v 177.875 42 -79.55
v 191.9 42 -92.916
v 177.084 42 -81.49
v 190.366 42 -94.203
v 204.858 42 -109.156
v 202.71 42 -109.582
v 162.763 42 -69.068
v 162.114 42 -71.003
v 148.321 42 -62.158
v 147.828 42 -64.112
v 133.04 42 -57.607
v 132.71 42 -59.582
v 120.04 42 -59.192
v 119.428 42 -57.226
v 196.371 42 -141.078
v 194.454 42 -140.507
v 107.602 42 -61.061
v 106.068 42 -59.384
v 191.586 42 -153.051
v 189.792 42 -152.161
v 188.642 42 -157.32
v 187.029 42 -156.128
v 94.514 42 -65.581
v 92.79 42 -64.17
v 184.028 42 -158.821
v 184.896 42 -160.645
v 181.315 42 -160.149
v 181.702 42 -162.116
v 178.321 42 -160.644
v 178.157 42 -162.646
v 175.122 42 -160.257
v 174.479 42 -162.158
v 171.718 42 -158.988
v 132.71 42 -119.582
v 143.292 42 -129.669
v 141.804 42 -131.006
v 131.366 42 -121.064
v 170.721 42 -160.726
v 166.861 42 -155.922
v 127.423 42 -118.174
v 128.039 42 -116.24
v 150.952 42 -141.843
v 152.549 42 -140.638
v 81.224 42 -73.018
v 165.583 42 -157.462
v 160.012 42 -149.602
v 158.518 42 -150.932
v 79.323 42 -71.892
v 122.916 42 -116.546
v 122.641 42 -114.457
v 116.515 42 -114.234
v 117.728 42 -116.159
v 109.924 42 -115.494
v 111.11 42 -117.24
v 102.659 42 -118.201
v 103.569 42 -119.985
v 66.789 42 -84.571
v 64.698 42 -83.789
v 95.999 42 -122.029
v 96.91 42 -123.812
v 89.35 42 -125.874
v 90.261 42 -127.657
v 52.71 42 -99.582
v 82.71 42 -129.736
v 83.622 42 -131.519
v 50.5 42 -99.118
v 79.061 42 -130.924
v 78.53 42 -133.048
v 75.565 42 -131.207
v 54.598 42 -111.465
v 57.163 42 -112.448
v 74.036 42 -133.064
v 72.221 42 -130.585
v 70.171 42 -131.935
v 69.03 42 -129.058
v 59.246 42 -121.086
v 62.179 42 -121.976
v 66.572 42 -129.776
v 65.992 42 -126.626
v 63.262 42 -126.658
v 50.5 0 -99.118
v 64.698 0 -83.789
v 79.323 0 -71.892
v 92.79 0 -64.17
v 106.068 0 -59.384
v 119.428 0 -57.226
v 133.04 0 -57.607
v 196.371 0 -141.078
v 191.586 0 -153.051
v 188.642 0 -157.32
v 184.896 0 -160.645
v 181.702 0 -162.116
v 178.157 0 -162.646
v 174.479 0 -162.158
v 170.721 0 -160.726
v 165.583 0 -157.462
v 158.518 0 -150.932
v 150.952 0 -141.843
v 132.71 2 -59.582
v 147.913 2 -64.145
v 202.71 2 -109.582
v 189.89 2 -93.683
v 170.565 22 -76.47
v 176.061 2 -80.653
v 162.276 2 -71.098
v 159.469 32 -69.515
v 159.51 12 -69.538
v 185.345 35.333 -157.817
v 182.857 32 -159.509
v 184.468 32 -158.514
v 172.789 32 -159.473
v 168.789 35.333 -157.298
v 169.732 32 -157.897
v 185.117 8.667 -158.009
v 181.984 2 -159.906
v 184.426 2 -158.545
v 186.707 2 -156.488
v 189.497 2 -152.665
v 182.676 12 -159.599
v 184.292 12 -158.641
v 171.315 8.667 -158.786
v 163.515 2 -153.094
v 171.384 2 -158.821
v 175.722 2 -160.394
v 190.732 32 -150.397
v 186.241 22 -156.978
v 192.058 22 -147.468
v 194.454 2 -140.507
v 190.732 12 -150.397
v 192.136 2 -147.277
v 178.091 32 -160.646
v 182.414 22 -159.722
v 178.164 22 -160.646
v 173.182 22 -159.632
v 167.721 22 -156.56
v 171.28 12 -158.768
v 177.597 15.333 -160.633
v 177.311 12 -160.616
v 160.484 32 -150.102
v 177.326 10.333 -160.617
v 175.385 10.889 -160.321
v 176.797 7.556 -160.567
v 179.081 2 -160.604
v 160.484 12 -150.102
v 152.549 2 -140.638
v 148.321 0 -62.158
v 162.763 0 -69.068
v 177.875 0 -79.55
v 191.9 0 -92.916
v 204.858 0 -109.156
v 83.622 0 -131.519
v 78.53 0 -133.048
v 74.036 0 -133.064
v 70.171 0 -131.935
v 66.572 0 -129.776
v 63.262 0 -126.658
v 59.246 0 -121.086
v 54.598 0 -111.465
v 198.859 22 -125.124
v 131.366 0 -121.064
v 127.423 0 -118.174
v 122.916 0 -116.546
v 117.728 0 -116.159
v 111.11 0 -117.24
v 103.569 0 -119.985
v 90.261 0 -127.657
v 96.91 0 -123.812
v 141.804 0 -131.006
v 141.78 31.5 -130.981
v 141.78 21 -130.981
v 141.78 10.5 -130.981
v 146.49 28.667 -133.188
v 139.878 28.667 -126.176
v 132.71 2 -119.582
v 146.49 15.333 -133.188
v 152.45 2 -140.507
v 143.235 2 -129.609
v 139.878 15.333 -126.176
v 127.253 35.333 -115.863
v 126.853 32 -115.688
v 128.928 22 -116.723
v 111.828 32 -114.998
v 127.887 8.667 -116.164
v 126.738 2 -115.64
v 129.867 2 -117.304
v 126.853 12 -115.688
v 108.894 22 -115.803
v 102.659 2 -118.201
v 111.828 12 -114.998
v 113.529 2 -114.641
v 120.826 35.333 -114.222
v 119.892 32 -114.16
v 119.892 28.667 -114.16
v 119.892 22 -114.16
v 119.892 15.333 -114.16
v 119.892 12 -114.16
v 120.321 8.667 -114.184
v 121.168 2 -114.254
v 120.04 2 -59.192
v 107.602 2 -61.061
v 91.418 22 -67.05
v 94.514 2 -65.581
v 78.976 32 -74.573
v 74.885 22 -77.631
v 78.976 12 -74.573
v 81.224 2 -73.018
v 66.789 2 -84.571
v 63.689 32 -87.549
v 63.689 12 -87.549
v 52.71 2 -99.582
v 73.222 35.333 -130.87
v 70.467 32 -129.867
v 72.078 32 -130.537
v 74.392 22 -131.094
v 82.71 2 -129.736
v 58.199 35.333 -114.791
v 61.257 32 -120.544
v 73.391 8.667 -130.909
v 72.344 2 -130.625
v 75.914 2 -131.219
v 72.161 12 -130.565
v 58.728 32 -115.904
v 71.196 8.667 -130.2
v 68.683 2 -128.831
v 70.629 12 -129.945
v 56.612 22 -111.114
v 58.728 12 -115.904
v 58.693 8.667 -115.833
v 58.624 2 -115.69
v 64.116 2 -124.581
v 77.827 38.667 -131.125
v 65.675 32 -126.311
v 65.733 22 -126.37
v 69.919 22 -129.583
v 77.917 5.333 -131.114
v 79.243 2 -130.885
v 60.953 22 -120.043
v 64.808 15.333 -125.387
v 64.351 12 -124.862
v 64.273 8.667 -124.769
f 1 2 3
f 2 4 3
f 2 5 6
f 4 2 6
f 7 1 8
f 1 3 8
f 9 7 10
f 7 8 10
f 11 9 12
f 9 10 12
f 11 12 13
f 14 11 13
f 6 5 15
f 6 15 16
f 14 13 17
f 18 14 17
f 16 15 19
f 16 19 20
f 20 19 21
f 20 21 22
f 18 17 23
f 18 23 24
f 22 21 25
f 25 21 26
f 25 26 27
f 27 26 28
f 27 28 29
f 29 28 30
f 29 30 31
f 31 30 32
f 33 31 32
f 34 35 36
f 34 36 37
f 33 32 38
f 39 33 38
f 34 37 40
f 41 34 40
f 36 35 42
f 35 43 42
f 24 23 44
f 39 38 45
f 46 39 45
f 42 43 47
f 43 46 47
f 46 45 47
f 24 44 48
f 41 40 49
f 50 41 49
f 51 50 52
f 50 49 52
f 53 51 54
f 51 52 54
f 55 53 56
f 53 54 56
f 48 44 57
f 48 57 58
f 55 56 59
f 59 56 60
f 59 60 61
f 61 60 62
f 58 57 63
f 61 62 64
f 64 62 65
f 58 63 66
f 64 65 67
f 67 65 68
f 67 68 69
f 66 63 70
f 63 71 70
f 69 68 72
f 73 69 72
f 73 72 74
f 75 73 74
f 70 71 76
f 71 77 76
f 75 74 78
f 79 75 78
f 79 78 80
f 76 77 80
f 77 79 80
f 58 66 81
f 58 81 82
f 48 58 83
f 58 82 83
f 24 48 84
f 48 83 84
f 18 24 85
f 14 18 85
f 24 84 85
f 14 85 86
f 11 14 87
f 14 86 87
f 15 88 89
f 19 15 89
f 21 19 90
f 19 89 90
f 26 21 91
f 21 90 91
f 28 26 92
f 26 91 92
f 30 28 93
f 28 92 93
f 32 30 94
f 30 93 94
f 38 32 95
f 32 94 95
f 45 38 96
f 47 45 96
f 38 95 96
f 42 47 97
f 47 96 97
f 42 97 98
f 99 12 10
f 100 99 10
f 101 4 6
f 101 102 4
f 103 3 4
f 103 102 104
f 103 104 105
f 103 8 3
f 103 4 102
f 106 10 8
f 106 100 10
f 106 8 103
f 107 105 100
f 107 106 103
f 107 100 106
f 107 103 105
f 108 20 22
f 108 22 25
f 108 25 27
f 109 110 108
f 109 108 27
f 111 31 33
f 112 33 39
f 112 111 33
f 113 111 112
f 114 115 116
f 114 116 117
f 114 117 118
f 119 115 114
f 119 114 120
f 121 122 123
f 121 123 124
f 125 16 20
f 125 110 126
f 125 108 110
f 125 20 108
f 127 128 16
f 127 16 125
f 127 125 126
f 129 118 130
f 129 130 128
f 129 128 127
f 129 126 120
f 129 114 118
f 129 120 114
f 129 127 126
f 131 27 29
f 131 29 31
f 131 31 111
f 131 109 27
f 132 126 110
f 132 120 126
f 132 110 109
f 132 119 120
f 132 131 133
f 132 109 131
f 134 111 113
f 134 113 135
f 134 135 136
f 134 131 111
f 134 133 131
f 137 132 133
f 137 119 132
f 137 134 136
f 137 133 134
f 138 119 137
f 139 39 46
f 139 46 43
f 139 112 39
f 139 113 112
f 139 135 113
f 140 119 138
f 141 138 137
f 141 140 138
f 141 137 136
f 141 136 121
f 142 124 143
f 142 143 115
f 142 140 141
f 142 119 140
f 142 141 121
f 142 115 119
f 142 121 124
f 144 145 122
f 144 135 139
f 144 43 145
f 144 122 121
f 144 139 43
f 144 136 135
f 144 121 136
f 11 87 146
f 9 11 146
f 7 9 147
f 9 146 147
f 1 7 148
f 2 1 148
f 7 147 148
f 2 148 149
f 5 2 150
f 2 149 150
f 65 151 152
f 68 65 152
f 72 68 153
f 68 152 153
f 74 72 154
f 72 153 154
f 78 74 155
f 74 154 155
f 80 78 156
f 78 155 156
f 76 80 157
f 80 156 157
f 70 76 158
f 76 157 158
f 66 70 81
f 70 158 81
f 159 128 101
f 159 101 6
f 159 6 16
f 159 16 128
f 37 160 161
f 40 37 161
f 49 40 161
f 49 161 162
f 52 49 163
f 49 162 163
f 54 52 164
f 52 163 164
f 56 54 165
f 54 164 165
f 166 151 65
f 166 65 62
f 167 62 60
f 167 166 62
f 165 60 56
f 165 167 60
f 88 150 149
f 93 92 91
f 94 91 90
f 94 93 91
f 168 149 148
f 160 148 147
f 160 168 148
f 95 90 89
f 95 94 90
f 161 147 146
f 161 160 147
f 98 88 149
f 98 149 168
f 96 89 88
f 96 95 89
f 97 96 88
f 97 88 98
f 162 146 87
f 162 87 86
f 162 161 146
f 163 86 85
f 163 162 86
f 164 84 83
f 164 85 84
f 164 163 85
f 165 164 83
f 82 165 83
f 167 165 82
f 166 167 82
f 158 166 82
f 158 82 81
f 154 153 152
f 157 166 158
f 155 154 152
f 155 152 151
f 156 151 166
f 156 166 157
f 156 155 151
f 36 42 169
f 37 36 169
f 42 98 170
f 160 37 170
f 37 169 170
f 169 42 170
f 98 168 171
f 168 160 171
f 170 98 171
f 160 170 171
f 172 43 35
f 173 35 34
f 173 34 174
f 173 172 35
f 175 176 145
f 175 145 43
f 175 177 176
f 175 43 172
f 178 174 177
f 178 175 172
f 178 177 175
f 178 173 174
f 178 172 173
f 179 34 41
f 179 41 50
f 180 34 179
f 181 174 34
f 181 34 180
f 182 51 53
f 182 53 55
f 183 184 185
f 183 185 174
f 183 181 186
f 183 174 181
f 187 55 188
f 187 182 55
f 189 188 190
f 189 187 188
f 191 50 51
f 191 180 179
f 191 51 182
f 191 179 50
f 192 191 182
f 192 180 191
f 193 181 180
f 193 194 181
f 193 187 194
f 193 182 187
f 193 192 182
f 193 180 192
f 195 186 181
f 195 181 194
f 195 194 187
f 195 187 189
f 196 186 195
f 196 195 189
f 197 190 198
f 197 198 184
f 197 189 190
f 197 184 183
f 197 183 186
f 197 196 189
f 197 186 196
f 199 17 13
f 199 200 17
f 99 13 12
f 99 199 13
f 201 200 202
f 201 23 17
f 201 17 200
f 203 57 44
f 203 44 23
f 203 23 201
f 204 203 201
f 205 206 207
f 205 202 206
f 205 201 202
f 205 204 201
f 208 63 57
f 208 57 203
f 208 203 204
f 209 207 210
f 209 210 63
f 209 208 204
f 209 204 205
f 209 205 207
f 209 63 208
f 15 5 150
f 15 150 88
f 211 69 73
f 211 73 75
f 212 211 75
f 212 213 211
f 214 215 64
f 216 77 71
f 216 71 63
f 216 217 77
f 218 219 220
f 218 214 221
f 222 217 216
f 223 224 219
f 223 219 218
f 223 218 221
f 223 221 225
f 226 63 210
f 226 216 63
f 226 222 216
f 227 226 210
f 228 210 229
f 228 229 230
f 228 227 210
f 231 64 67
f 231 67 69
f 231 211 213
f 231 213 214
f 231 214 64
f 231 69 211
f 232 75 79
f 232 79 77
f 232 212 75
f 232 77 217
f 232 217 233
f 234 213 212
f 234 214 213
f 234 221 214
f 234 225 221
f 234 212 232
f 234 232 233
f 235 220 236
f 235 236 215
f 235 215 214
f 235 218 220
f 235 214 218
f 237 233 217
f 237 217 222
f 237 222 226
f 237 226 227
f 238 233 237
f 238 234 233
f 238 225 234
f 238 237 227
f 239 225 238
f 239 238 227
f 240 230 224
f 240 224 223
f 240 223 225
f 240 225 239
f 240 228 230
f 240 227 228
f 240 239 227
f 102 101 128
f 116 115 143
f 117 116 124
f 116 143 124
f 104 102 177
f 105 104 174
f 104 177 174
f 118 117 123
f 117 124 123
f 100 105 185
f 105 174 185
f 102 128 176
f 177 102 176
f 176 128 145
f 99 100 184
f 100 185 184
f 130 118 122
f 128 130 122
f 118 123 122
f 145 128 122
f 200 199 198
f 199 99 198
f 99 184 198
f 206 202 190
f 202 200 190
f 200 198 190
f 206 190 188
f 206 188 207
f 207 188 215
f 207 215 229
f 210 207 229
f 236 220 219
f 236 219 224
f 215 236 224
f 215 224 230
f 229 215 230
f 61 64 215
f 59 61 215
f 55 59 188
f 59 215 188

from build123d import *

# Parameters (mm, degrees)
SALIENTE_EXTRUIR1_DEPTH = 2
SALIENTE_EXTRUIR2_START = -2
SALIENTE_EXTRUIR2_DEPTH = 42


with BuildPart() as part:
    # Croquis4 → Saliente-Extruir1 (new body)
    with BuildSketch(Plane(origin=(0, 0, 0), x_dir=(1, 0, 0), z_dir=(0, 1, 0))):
        with BuildLine():
            add(Edge.make_bspline(
                [(52.710297529, 99.582127302), (63.756561517, 138.081595195), (82.710297529, 129.735907435)],
                knots=[0, 0, 0, 0.959481385, 0.959481385, 0.959481385], degree=2))
            add(Edge.make_bspline(
                [(52.710297529, 99.582127302), (90.126545005, 54.518849823), (132.710297529, 59.582127302)],
                knots=[0, 0, 0, 0.796718819, 0.796718819, 0.796718819], degree=2))
            add(Edge.make_bspline(
                [(202.710297529, 109.582127302), (173.420126191, 68.358434503), (132.710297529, 59.582127302)],
                knots=[0, 0, 0, 0.720516106, 0.720516106, 0.720516106], degree=2))
            add(Edge.make_bspline(
                [(194.454170212, 140.507214192), (199.136053193, 125.204121307), (202.710297529, 109.582127302)],
                knots=[0, 0, 0, 0.675598466, 0.675598466, 0.675598466], degree=2))
            add(Edge.make_bspline(
                [(152.449897532, 140.507214192), (182.808256429, 180.784913915), (194.454170212, 140.507214192)],
                knots=[0, 0, 0, 1, 1, 1], degree=2))
            add(Edge.make_bspline(
                [(132.710297529, 119.582127302), (140.11488779, 125.935824124), (146.690299112, 132.884341967), (152.449897532, 140.507214192)],
                knots=[0, 0, 0, 0, 0.833964402, 0.833964402, 0.833964402, 0.833964402], degree=3))
            add(Edge.make_bspline(
                [(102.65877087, 118.201219927), (122.100312055, 109.428474087), (132.710297529, 119.582127302)],
                knots=[0, 0, 0, 0.908986228, 0.908986228, 0.908986228], degree=2))
            add(Edge.make_bspline(
                [(82.710297529, 129.735907435), (92.671997726, 123.923322823), (102.65877087, 118.201219927)],
                knots=[0, 0, 0, 0.910186202, 0.910186202, 0.910186202], degree=2))
        make_face()
    extrude(amount=SALIENTE_EXTRUIR1_DEPTH)


with BuildPart() as saliente_extruir2_tool:
    # Croquis19 → Saliente-Extruir2 (new body)
    with BuildSketch(Plane(origin=(0, 2, 0), x_dir=(1, 0, 0), z_dir=(0, 1, 0)).offset(SALIENTE_EXTRUIR2_START)):
        with BuildLine():
            ThreePointArc((83.62236865, 131.519291558), (93.584161606, 125.732410099), (103.568713537, 119.984885532))
            add(Edge.make_bspline(
                [(131.365719965, 121.063748092), (130.971888683, 120.684835363), (130.142632133, 119.9517928), (128.438784912, 118.697522102), (126.162778494, 117.462528487), (123.183412129, 116.506911998), (119.912471769, 116.071224684), (116.324809268, 116.172759218), (113.063366868, 116.72219656), (110.29220395, 117.449231612), (108.134536322, 118.139339847), (106.268418782, 118.837388441), (104.741437099, 119.467238276), (103.95605498, 119.810793101), (103.568713537, 119.984885532)],
                knots=[0.499479639, 0.499479639, 0.499479639, 0.499479639, 0.499622406, 0.499765174, 0.500050708, 0.500336242, 0.500621776, 0.500907311, 0.501192845, 0.501335612, 0.501478379, 0.501621146, 0.50169253, 0.501763914, 0.501763914, 0.501763914, 0.501763914], degree=3))
            add(Edge.make_bspline(
                [(150.95199089, 141.842528057), (149.526755213, 139.951249583), (146.571479335, 136.248825133), (141.830479534, 130.941084133), (136.787475181, 125.875234297), (133.19424387, 122.632759491), (131.365719965, 121.063748092)],
                knots=[-3.407e-05, -3.407e-05, -3.407e-05, -3.407e-05, 0.210052577, 0.420139224, 0.630225871, 0.840312518, 0.840312518, 0.840312518, 0.840312518], degree=3))
            add(Edge.make_bspline(
                [(196.371161118, 141.077635904), (196.248795755, 141.500563841), (195.995397252, 142.352285229), (195.48073896, 143.986147771), (194.809972536, 145.941130105), (193.963876481, 148.134691236), (192.777490455, 150.861896983), (191.18107336, 153.901083064), (188.359000505, 157.974905621), (184.238162706, 161.603811097), (178.221700824, 163.150703065), (172.92813627, 161.916340062), (168.615333395, 159.654290079), (165.303845353, 157.336157381), (161.897909374, 154.406523973), (158.966988471, 151.456103514), (156.561279242, 148.789333407), (154.72613836, 146.636533397), (153.168453014, 144.712387311), (151.909452091, 143.100825644), (151.267942364, 142.260777118), (150.95199089, 141.842528057)],
                knots=[0.497988609, 0.497988609, 0.497988609, 0.497988609, 0.498059528, 0.498130447, 0.498272286, 0.498414124, 0.498555962, 0.498839638, 0.499123315, 0.499690668, 0.500258021, 0.500825374, 0.50110905, 0.501392727, 0.501676403, 0.501960079, 0.502101918, 0.502243756, 0.502385594, 0.502456513, 0.502527432, 0.502527432, 0.502527432, 0.502527432], degree=3))
            add(Edge.make_bspline(
                [(204.858492638, 109.156288537), (204.249367291, 111.843236182), (202.981172007, 117.207552496), (200.93288469, 125.208306826), (198.73765845, 133.167598608), (197.176202956, 138.445971282), (196.371161118, 141.077635904)],
                knots=[0.499571789, 0.499571789, 0.499571789, 0.499571789, 0.499709653, 0.499847517, 0.499985381, 0.500123245, 0.500123245, 0.500123245, 0.500123245], degree=3))
            add(Edge.make_bspline(
                [(133.039987072, 57.607298121), (136.517017027, 58.353588239), (143.410304061, 60.211208361), (153.331921439, 64.042793156), (162.890265106, 68.929810065), (172.064001952, 74.864194253), (180.854741648, 81.841702982), (187.85941484, 88.520970761), (193.271403672, 94.381452844), (197.234097167, 99.034056041), (200.458372672, 103.128234116), (202.986483638, 106.526999655), (204.241393684, 108.278784185), (204.858492638, 109.156288537)],
                knots=[0.499550345, 0.499550345, 0.499550345, 0.499550345, 0.499920524, 0.500290703, 0.500660881, 0.50103106, 0.501401239, 0.501771418, 0.501956507, 0.502141596, 0.502326686, 0.50241923, 0.502511775, 0.502511775, 0.502511775, 0.502511775], degree=3))
            add(Edge.make_bspline(
                [(50.499998363, 99.117827857), (51.28713851, 98.159265707), (52.890478228, 96.244606437), (56.086666196, 92.579661214), (60.120878243, 88.23562625), (65.006762747, 83.424905696), (71.588596042, 77.539618496), (79.941105501, 71.180357421), (90.169736046, 65.152928032), (100.604072147, 60.742602073), (111.233689738, 57.963400667), (120.24760203, 57.016603306), (127.525650082, 57.079807576), (131.212661015, 57.387753526), (133.039987072, 57.607298121)],
                knots=[0.497081408, 0.497081408, 0.497081408, 0.497081408, 0.49719343, 0.497305453, 0.497529497, 0.497753542, 0.497977587, 0.498425676, 0.498873765, 0.499321855, 0.499769944, 0.500218033, 0.500442078, 0.500666123, 0.500666123, 0.500666123, 0.500666123], degree=3))
            add(Edge.make_bspline(
                [(83.62236865, 131.519291558), (83.190564237, 131.711951172), (82.306221846, 132.074777828), (80.565610632, 132.658261641), (78.390963008, 133.138657799), (75.809004868, 133.290414791), (72.428155416, 132.910719977), (68.40918787, 131.337949061), (64.074405033, 127.853972923), (60.176273009, 122.906250357), (57.22522126, 117.581734073), (55.018923032, 112.59516445), (53.438684901, 108.492028222), (52.179464056, 104.761070862), (51.210491315, 101.605518316), (50.730590106, 99.941775987), (50.499998363, 99.117827857)],
                knots=[0.499165355, 0.499165355, 0.499165355, 0.499165355, 0.49927472, 0.499384085, 0.499602815, 0.499821545, 0.500040276, 0.500477736, 0.500915196, 0.501352656, 0.501790116, 0.502008846, 0.502227576, 0.502446306, 0.502555671, 0.502665036, 0.502665036, 0.502665036, 0.502665036], degree=3))
        make_face()
        with BuildLine():
            ThreePointArc((82.71029754, 129.73590743), (92.673161251, 123.948894915), (102.658770868, 118.201219928))
            add(Edge.make_bspline(
                [(132.710297529, 119.582127302), (122.100312054, 109.428474087), (102.658770868, 118.201219928)],
                knots=[0, 0, 0, 1, 1, 1], degree=2))
            add(Edge.make_bspline(
                [(152.54853475, 140.637933075), (146.765405271, 132.963757867), (140.157191664, 125.972124037), (132.710297529, 119.582127302)],
                knots=[0, 0, 0, 0, 0.838729004, 0.838729004, 0.838729004, 0.838729004], degree=3))
            add(Edge.make_bspline(
                [(194.454170212, 140.507214192), (182.827185257, 180.719448068), (152.54853475, 140.637933075)],
                knots=[0, 0, 0, 1, 1, 1], degree=2))
            add(Edge.make_bspline(
                [(202.710297591, 109.58212739), (199.136053222, 125.204121351), (194.454170212, 140.507214192)],
                knots=[0, 0, 0, 1, 1, 1], degree=2))
            add(Edge.make_bspline(
                [(132.710297645, 59.582127316), (173.420126277, 68.358434565), (202.710297591, 109.58212739)],
                knots=[0, 0, 0, 1, 1, 1], degree=2))
            add(Edge.make_bspline(
                [(52.710297498, 99.582127194), (90.126545043, 54.518849734), (132.710297645, 59.582127316)],
                knots=[0, 0, 0, 1, 1, 1], degree=2))
            add(Edge.make_bspline(
                [(82.71029754, 129.73590743), (63.756561494, 138.081595218), (52.710297498, 99.582127194)],
                knots=[0, 0, 0, 1, 1, 1], degree=2))
        make_face(mode=Mode.SUBTRACT)
    extrude(amount=SALIENTE_EXTRUIR2_DEPTH)


with BuildPart() as part_1:
    add(part.part)


with BuildPart() as part_2:
    # Saliente-Extruir2: joined with saliente_extruir2_tool
    add(part_1.part.fuse(saliente_extruir2_tool.part, tol=0.00001))


solid = part_2.part
